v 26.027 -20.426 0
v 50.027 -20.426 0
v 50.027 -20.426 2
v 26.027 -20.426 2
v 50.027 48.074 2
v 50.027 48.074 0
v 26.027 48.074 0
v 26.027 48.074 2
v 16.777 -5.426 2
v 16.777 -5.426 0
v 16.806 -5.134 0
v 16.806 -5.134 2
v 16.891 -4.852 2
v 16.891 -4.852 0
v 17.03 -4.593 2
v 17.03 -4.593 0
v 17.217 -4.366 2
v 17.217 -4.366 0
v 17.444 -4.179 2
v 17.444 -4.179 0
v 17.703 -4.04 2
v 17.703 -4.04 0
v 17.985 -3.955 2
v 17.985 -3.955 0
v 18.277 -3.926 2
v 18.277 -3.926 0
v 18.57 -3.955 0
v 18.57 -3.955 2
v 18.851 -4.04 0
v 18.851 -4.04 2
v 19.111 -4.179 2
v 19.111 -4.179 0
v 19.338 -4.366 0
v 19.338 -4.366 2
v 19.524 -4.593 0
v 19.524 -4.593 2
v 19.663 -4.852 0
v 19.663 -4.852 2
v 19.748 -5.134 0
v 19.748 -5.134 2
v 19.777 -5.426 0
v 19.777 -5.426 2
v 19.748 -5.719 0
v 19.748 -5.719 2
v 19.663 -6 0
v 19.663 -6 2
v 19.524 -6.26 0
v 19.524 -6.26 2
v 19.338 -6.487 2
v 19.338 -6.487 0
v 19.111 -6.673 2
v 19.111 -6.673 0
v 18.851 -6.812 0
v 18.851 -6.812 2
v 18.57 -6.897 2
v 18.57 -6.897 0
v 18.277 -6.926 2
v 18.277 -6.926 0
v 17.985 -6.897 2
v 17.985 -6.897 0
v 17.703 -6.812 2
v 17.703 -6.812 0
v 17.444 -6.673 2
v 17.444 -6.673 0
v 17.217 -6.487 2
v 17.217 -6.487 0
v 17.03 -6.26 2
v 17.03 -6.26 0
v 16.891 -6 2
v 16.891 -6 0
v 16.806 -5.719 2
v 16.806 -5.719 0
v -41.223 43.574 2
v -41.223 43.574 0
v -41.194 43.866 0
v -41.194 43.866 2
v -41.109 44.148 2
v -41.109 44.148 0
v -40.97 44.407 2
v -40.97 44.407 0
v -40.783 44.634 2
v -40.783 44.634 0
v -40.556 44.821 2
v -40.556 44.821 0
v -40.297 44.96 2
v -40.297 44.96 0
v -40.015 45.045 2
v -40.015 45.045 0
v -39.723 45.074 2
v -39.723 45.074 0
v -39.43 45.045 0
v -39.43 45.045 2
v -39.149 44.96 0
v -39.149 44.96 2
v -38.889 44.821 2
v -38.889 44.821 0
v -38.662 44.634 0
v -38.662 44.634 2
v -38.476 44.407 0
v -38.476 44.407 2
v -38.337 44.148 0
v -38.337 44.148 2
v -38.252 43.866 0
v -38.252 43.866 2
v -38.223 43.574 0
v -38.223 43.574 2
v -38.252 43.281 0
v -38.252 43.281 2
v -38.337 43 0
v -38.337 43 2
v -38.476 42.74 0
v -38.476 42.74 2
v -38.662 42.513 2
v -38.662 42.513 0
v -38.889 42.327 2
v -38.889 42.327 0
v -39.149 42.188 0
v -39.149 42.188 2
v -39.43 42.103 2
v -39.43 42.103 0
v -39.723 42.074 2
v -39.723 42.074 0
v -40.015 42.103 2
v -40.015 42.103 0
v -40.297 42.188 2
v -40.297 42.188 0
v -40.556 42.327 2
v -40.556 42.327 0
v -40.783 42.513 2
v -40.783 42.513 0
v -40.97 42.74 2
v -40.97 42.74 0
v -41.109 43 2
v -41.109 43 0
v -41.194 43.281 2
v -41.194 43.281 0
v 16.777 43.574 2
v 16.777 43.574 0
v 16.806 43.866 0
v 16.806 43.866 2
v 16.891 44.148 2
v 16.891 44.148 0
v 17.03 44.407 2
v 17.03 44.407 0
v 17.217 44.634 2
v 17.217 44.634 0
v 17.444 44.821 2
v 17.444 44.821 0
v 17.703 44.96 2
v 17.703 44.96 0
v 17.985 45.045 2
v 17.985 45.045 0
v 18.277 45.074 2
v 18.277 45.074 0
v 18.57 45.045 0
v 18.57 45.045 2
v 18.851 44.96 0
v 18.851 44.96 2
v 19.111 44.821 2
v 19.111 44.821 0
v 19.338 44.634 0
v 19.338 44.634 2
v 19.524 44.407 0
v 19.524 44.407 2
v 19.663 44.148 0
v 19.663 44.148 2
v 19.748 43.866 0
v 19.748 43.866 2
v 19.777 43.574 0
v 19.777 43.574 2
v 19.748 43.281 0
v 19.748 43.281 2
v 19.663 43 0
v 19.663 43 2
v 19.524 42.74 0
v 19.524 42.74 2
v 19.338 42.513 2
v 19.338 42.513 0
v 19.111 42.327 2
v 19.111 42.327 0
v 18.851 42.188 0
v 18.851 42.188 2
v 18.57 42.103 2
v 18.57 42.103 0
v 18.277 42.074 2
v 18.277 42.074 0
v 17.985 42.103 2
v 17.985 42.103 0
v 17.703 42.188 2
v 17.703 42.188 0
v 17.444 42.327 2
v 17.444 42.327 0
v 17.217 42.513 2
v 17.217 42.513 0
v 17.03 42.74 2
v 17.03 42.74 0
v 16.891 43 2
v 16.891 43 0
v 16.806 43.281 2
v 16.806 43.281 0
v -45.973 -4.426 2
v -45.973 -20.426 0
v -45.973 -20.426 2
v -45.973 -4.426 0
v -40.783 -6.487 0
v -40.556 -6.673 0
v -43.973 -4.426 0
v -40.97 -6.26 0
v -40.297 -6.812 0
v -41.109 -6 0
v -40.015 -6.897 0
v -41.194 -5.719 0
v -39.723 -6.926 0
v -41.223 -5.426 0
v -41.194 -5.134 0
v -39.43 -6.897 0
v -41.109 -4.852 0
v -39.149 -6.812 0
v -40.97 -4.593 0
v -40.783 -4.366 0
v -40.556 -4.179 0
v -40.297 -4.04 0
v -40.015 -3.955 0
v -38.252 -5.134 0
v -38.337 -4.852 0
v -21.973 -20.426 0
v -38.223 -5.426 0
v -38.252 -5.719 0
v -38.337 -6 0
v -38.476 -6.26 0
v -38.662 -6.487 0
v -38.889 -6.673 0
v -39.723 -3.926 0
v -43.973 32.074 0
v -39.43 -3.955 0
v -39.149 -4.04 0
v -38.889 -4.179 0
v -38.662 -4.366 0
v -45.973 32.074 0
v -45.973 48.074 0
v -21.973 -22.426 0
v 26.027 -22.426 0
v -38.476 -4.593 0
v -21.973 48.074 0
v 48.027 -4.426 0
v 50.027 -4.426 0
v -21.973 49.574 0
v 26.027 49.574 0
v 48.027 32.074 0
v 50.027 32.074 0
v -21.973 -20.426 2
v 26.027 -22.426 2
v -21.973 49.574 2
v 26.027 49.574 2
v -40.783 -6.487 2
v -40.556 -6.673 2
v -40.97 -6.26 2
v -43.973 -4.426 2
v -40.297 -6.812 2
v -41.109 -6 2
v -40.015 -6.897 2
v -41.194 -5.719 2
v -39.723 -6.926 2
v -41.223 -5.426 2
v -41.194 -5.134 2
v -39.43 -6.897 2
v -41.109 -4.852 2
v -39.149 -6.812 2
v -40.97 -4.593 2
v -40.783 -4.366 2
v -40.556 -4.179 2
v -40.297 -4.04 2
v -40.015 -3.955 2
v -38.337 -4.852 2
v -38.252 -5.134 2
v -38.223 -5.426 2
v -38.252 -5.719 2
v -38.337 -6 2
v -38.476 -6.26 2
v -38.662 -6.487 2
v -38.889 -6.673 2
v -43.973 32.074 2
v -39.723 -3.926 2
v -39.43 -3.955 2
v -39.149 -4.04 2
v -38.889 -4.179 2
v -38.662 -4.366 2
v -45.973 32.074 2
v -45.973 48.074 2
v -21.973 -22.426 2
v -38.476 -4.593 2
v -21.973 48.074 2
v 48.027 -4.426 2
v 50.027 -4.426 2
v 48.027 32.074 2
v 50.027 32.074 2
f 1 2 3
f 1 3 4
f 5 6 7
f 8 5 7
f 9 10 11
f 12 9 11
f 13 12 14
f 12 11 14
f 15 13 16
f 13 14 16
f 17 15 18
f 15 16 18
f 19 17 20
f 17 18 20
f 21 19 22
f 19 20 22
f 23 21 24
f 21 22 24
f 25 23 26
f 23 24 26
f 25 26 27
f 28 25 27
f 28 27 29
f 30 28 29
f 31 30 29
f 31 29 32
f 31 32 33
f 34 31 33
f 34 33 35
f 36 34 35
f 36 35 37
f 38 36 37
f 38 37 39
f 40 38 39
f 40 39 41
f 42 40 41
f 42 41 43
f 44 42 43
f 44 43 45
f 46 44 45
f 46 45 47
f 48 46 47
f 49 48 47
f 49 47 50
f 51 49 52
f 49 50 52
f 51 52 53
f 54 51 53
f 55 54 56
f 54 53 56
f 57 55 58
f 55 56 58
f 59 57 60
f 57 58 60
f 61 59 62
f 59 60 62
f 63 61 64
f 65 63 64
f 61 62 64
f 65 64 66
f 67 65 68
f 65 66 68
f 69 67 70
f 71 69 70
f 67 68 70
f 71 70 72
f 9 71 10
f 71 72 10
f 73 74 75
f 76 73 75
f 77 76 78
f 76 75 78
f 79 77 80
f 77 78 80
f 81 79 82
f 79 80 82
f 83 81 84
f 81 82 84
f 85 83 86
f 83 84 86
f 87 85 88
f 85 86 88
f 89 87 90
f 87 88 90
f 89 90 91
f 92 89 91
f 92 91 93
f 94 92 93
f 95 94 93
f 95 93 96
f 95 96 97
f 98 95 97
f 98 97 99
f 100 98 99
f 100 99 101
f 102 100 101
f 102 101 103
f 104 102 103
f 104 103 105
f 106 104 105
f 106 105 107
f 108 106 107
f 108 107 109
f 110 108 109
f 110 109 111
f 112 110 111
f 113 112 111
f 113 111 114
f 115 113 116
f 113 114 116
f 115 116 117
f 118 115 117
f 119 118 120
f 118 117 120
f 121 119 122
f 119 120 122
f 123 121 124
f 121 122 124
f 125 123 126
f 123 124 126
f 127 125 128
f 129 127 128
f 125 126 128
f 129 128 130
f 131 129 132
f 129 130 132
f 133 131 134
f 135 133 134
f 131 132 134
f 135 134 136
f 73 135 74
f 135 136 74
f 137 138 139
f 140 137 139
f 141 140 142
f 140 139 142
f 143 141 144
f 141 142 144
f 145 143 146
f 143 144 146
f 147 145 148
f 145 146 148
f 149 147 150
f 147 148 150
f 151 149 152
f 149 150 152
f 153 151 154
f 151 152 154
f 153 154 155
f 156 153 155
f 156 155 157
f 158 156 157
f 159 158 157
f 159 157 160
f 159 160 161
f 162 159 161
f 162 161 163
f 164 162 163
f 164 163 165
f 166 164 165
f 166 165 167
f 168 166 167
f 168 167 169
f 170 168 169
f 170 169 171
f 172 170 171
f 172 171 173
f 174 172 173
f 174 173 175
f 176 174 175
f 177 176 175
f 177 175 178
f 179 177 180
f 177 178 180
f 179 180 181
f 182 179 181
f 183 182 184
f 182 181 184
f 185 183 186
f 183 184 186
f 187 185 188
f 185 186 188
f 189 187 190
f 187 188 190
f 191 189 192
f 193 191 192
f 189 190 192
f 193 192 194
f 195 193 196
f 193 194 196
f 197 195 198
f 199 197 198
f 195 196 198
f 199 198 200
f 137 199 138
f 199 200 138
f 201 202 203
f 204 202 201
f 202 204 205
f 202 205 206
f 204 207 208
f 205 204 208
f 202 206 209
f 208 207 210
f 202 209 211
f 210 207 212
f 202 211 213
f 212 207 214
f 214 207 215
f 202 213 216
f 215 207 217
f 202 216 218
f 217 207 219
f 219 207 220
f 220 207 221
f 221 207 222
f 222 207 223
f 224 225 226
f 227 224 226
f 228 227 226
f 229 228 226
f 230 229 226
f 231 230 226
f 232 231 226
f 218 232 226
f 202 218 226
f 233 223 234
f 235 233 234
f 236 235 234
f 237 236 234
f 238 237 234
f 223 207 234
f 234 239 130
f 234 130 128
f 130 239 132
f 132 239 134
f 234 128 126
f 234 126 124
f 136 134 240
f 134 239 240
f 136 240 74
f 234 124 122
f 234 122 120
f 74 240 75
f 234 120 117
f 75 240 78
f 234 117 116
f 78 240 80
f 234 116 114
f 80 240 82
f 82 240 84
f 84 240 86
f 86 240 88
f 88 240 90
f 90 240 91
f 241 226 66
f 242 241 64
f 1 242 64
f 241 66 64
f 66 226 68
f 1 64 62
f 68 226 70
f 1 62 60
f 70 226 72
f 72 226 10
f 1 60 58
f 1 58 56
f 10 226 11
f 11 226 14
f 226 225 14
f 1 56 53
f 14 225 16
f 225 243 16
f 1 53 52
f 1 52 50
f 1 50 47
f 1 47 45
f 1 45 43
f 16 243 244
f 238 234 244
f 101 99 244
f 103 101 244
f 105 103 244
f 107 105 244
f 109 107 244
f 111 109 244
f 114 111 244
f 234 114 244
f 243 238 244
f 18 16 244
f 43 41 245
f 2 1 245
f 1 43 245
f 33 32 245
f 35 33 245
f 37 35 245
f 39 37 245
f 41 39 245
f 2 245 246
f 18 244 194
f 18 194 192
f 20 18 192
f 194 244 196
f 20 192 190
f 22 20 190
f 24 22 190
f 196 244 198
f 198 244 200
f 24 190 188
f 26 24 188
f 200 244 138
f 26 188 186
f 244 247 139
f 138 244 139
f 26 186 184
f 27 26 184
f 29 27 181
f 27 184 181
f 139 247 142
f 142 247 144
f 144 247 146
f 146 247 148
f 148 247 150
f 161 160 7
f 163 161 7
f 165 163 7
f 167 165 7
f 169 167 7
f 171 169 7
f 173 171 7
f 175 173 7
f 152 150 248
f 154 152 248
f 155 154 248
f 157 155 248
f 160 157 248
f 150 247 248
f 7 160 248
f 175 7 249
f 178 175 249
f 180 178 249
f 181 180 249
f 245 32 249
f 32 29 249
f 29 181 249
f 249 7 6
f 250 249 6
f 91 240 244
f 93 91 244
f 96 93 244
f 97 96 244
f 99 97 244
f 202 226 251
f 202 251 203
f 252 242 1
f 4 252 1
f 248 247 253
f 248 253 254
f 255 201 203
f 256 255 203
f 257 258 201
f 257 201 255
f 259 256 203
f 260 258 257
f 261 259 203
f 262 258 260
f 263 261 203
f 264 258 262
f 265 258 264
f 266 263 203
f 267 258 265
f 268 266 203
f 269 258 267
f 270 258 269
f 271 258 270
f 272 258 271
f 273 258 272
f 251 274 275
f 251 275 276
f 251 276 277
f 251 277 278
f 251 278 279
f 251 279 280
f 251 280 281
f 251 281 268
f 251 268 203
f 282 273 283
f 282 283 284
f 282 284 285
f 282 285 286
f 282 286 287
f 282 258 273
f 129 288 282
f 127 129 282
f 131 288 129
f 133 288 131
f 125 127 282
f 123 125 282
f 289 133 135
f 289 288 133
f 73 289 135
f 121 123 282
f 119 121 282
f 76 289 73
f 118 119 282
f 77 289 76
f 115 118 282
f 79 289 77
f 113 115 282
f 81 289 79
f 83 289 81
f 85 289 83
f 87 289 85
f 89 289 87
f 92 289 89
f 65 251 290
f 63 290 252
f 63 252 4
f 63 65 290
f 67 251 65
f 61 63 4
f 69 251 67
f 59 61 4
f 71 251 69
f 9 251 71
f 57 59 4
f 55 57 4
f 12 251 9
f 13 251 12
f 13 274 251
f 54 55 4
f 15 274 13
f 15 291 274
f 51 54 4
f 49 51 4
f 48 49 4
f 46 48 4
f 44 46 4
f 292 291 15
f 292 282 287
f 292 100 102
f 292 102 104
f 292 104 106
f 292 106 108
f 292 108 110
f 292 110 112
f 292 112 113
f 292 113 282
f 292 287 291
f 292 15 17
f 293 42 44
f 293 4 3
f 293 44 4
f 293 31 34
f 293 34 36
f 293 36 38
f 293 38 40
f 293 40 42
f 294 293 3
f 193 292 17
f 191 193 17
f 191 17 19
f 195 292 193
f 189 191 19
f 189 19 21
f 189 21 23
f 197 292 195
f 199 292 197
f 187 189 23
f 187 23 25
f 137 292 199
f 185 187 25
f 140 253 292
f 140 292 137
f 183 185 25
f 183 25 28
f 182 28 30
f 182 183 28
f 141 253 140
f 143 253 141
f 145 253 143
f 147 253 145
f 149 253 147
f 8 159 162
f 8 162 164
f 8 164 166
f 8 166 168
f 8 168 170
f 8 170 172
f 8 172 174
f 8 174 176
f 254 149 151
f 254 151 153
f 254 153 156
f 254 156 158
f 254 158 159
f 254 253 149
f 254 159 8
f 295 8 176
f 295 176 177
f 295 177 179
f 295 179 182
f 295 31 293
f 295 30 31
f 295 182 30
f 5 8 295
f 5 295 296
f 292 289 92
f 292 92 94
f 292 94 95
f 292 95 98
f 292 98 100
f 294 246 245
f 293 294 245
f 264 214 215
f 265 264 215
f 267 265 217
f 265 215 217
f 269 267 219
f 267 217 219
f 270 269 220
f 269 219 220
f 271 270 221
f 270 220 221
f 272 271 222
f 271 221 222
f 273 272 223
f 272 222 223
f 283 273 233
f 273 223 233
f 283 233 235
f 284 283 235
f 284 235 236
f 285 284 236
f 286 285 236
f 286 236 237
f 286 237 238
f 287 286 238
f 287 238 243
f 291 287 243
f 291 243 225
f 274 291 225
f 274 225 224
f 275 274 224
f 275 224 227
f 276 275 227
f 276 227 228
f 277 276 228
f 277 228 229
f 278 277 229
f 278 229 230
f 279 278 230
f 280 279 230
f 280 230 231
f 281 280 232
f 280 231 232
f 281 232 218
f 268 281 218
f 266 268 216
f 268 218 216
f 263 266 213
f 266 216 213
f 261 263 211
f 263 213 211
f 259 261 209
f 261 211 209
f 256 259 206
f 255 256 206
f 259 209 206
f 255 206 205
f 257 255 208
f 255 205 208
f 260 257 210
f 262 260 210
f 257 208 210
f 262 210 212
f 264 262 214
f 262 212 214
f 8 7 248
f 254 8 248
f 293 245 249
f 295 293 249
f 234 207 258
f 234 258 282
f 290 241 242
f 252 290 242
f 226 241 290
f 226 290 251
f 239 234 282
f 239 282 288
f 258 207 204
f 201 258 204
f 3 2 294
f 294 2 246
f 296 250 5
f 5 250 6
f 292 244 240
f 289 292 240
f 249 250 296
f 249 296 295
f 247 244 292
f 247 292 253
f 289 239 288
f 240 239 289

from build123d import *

# Parameters (mm, degrees)
SKETCH_1_W          = 96
SKETCH_1_H          = 72
EXTRUDE_1_DEPTH     = 2
SKETCH_2_R          = 1.5
CUT_EXTRUDE_1_DEPTH = 3
SKETCH_3_W          = 24
SKETCH_3_H          = 2
CUT_EXTRUDE_2_DEPTH = 3
SKETCH_4_W          = 24
SKETCH_4_H          = 2
CUT_EXTRUDE_3_DEPTH = 3
SKETCH_5_W          = 2
SKETCH_5_H          = 36.5
CUT_EXTRUDE_4_DEPTH = 3
SKETCH_6_W          = 2
SKETCH_6_H          = 36.5
CUT_EXTRUDE_5_DEPTH = 3


with BuildPart() as part:
    # ｽｹｯﾁ1 → ﾎﾞｽ - 押し出し1 (new body)
    with BuildSketch(Plane.XY):
        with Locations((2.027244426, 13.573770492)):
            Rectangle(SKETCH_1_W, SKETCH_1_H)
    extrude(amount=EXTRUDE_1_DEPTH)

    # ｽｹｯﾁ2 → ｶｯﾄ - 押し出し1 (cut, through all)
    with BuildSketch(Plane(origin=(0, 0, 0), x_dir=(-1, 0, 0), z_dir=(0, 0, -1))):
        with Locations((-18.277244426, -5.426229508)):
            Circle(SKETCH_2_R)
        with Locations((-18.277244426, 43.573770492)):
            Circle(SKETCH_2_R)
        with Locations((39.722755574, -5.426229508)):
            Circle(SKETCH_2_R)
        with Locations((39.722755574, 43.573770492)):
            Circle(SKETCH_2_R)
    extrude(amount=-CUT_EXTRUDE_1_DEPTH, mode=Mode.SUBTRACT)

    # ｽｹｯﾁ3 → ｶｯﾄ - 押し出し2 (cut, through all)
    with BuildSketch(Plane(origin=(0, 0, 0), x_dir=(-1, 0, 0), z_dir=(0, 0, -1))):
        with Locations((33.972755574, -21.426229508)):
            Rectangle(SKETCH_3_W, SKETCH_3_H)
        with Locations((-38.027244426, -21.426229508)):
            Rectangle(SKETCH_3_W, SKETCH_3_H)
    extrude(amount=-CUT_EXTRUDE_2_DEPTH, mode=Mode.SUBTRACT)

    # ｽｹｯﾁ4 → ｶｯﾄ - 押し出し3 (cut, through all)
    with BuildSketch(Plane(origin=(0, 0, 0), x_dir=(-1, 0, 0), z_dir=(0, 0, -1))):
        with Locations((33.972755574, 49.073770492)):
            Rectangle(SKETCH_4_W, SKETCH_4_H)
        with Locations((-38.027244426, 49.073770492)):
            Rectangle(SKETCH_4_W, SKETCH_4_H)
    extrude(amount=-CUT_EXTRUDE_3_DEPTH, mode=Mode.SUBTRACT)

    # ｽｹｯﾁ5 → ｶｯﾄ - 押し出し4 (cut, through all)
    with BuildSketch(Plane(origin=(0, 0, 0), x_dir=(-1, 0, 0), z_dir=(0, 0, -1))):
        with Locations((44.972755574, 13.823770492)):
            Rectangle(SKETCH_5_W, SKETCH_5_H)
    extrude(amount=-CUT_EXTRUDE_4_DEPTH, mode=Mode.SUBTRACT)

    # ｽｹｯﾁ6 → ｶｯﾄ - 押し出し5 (cut, through all)
    with BuildSketch(Plane(origin=(0, 0, 0), x_dir=(-1, 0, 0), z_dir=(0, 0, -1))):
        with Locations((-49.027244426, 13.823770492)):
            Rectangle(SKETCH_6_W, SKETCH_6_H)
    extrude(amount=-CUT_EXTRUDE_5_DEPTH, mode=Mode.SUBTRACT)


solid = part.part
